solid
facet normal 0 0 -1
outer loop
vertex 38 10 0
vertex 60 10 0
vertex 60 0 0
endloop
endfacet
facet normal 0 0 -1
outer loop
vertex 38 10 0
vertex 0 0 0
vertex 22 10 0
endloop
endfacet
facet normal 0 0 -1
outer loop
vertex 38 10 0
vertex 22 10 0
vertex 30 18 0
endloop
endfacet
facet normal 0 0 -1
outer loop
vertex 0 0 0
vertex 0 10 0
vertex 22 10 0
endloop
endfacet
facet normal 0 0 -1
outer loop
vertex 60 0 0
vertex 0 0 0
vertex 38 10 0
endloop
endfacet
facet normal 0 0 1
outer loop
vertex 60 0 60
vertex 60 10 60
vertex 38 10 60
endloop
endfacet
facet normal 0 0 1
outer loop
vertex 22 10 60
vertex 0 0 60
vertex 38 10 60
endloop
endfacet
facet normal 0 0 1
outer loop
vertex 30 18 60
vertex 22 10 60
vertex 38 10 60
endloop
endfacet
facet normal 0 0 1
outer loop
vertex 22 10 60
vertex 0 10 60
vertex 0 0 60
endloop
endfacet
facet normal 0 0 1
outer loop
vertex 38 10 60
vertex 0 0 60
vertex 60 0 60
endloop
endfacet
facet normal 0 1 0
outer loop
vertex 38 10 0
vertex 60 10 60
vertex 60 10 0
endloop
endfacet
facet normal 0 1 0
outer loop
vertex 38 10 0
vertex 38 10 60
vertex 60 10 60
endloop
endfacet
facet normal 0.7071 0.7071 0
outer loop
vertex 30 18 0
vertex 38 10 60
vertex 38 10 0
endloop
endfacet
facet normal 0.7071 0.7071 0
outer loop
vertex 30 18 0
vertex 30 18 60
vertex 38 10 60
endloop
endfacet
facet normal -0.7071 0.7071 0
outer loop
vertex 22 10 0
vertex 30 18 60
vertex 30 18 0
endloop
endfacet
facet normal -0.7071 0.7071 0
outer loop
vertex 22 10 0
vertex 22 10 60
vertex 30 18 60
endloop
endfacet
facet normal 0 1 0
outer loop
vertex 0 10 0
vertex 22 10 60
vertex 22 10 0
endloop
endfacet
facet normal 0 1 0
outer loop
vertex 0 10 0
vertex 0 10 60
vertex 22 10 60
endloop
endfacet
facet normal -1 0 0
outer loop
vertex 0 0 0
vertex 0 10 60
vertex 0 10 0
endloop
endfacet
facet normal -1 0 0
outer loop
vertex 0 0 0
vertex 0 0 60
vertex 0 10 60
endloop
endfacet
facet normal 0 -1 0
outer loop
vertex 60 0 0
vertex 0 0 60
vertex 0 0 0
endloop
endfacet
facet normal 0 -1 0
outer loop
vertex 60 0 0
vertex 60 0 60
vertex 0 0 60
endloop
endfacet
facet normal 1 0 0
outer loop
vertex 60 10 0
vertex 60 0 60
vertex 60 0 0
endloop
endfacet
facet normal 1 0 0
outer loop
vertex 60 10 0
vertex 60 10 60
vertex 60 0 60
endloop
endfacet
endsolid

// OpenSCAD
$fn = 32;

// ----------------------------------------------------------------------
// V guide rail: vrib, 60 mm wide
// ----------------------------------------------------------------------

// --- parameters (mm) ---
rail_w = 60;              // rail width, X
base_t = 10;              // base plate thickness
v_depth = 8;              // V feature depth / height
v_half_w = 8;             // half width of the V at the base face
plate_t = 60;             // rail length, Z (the extrusion height)

profile = [[0, 0], [60, 0], [60, 10], [38, 10], [30, 18], [22, 10], [0, 10]];  // primary outline, 7 points, counter clockwise

// --- the one profile operation ---
linear_extrude(height = plate_t) polygon(points = profile);
